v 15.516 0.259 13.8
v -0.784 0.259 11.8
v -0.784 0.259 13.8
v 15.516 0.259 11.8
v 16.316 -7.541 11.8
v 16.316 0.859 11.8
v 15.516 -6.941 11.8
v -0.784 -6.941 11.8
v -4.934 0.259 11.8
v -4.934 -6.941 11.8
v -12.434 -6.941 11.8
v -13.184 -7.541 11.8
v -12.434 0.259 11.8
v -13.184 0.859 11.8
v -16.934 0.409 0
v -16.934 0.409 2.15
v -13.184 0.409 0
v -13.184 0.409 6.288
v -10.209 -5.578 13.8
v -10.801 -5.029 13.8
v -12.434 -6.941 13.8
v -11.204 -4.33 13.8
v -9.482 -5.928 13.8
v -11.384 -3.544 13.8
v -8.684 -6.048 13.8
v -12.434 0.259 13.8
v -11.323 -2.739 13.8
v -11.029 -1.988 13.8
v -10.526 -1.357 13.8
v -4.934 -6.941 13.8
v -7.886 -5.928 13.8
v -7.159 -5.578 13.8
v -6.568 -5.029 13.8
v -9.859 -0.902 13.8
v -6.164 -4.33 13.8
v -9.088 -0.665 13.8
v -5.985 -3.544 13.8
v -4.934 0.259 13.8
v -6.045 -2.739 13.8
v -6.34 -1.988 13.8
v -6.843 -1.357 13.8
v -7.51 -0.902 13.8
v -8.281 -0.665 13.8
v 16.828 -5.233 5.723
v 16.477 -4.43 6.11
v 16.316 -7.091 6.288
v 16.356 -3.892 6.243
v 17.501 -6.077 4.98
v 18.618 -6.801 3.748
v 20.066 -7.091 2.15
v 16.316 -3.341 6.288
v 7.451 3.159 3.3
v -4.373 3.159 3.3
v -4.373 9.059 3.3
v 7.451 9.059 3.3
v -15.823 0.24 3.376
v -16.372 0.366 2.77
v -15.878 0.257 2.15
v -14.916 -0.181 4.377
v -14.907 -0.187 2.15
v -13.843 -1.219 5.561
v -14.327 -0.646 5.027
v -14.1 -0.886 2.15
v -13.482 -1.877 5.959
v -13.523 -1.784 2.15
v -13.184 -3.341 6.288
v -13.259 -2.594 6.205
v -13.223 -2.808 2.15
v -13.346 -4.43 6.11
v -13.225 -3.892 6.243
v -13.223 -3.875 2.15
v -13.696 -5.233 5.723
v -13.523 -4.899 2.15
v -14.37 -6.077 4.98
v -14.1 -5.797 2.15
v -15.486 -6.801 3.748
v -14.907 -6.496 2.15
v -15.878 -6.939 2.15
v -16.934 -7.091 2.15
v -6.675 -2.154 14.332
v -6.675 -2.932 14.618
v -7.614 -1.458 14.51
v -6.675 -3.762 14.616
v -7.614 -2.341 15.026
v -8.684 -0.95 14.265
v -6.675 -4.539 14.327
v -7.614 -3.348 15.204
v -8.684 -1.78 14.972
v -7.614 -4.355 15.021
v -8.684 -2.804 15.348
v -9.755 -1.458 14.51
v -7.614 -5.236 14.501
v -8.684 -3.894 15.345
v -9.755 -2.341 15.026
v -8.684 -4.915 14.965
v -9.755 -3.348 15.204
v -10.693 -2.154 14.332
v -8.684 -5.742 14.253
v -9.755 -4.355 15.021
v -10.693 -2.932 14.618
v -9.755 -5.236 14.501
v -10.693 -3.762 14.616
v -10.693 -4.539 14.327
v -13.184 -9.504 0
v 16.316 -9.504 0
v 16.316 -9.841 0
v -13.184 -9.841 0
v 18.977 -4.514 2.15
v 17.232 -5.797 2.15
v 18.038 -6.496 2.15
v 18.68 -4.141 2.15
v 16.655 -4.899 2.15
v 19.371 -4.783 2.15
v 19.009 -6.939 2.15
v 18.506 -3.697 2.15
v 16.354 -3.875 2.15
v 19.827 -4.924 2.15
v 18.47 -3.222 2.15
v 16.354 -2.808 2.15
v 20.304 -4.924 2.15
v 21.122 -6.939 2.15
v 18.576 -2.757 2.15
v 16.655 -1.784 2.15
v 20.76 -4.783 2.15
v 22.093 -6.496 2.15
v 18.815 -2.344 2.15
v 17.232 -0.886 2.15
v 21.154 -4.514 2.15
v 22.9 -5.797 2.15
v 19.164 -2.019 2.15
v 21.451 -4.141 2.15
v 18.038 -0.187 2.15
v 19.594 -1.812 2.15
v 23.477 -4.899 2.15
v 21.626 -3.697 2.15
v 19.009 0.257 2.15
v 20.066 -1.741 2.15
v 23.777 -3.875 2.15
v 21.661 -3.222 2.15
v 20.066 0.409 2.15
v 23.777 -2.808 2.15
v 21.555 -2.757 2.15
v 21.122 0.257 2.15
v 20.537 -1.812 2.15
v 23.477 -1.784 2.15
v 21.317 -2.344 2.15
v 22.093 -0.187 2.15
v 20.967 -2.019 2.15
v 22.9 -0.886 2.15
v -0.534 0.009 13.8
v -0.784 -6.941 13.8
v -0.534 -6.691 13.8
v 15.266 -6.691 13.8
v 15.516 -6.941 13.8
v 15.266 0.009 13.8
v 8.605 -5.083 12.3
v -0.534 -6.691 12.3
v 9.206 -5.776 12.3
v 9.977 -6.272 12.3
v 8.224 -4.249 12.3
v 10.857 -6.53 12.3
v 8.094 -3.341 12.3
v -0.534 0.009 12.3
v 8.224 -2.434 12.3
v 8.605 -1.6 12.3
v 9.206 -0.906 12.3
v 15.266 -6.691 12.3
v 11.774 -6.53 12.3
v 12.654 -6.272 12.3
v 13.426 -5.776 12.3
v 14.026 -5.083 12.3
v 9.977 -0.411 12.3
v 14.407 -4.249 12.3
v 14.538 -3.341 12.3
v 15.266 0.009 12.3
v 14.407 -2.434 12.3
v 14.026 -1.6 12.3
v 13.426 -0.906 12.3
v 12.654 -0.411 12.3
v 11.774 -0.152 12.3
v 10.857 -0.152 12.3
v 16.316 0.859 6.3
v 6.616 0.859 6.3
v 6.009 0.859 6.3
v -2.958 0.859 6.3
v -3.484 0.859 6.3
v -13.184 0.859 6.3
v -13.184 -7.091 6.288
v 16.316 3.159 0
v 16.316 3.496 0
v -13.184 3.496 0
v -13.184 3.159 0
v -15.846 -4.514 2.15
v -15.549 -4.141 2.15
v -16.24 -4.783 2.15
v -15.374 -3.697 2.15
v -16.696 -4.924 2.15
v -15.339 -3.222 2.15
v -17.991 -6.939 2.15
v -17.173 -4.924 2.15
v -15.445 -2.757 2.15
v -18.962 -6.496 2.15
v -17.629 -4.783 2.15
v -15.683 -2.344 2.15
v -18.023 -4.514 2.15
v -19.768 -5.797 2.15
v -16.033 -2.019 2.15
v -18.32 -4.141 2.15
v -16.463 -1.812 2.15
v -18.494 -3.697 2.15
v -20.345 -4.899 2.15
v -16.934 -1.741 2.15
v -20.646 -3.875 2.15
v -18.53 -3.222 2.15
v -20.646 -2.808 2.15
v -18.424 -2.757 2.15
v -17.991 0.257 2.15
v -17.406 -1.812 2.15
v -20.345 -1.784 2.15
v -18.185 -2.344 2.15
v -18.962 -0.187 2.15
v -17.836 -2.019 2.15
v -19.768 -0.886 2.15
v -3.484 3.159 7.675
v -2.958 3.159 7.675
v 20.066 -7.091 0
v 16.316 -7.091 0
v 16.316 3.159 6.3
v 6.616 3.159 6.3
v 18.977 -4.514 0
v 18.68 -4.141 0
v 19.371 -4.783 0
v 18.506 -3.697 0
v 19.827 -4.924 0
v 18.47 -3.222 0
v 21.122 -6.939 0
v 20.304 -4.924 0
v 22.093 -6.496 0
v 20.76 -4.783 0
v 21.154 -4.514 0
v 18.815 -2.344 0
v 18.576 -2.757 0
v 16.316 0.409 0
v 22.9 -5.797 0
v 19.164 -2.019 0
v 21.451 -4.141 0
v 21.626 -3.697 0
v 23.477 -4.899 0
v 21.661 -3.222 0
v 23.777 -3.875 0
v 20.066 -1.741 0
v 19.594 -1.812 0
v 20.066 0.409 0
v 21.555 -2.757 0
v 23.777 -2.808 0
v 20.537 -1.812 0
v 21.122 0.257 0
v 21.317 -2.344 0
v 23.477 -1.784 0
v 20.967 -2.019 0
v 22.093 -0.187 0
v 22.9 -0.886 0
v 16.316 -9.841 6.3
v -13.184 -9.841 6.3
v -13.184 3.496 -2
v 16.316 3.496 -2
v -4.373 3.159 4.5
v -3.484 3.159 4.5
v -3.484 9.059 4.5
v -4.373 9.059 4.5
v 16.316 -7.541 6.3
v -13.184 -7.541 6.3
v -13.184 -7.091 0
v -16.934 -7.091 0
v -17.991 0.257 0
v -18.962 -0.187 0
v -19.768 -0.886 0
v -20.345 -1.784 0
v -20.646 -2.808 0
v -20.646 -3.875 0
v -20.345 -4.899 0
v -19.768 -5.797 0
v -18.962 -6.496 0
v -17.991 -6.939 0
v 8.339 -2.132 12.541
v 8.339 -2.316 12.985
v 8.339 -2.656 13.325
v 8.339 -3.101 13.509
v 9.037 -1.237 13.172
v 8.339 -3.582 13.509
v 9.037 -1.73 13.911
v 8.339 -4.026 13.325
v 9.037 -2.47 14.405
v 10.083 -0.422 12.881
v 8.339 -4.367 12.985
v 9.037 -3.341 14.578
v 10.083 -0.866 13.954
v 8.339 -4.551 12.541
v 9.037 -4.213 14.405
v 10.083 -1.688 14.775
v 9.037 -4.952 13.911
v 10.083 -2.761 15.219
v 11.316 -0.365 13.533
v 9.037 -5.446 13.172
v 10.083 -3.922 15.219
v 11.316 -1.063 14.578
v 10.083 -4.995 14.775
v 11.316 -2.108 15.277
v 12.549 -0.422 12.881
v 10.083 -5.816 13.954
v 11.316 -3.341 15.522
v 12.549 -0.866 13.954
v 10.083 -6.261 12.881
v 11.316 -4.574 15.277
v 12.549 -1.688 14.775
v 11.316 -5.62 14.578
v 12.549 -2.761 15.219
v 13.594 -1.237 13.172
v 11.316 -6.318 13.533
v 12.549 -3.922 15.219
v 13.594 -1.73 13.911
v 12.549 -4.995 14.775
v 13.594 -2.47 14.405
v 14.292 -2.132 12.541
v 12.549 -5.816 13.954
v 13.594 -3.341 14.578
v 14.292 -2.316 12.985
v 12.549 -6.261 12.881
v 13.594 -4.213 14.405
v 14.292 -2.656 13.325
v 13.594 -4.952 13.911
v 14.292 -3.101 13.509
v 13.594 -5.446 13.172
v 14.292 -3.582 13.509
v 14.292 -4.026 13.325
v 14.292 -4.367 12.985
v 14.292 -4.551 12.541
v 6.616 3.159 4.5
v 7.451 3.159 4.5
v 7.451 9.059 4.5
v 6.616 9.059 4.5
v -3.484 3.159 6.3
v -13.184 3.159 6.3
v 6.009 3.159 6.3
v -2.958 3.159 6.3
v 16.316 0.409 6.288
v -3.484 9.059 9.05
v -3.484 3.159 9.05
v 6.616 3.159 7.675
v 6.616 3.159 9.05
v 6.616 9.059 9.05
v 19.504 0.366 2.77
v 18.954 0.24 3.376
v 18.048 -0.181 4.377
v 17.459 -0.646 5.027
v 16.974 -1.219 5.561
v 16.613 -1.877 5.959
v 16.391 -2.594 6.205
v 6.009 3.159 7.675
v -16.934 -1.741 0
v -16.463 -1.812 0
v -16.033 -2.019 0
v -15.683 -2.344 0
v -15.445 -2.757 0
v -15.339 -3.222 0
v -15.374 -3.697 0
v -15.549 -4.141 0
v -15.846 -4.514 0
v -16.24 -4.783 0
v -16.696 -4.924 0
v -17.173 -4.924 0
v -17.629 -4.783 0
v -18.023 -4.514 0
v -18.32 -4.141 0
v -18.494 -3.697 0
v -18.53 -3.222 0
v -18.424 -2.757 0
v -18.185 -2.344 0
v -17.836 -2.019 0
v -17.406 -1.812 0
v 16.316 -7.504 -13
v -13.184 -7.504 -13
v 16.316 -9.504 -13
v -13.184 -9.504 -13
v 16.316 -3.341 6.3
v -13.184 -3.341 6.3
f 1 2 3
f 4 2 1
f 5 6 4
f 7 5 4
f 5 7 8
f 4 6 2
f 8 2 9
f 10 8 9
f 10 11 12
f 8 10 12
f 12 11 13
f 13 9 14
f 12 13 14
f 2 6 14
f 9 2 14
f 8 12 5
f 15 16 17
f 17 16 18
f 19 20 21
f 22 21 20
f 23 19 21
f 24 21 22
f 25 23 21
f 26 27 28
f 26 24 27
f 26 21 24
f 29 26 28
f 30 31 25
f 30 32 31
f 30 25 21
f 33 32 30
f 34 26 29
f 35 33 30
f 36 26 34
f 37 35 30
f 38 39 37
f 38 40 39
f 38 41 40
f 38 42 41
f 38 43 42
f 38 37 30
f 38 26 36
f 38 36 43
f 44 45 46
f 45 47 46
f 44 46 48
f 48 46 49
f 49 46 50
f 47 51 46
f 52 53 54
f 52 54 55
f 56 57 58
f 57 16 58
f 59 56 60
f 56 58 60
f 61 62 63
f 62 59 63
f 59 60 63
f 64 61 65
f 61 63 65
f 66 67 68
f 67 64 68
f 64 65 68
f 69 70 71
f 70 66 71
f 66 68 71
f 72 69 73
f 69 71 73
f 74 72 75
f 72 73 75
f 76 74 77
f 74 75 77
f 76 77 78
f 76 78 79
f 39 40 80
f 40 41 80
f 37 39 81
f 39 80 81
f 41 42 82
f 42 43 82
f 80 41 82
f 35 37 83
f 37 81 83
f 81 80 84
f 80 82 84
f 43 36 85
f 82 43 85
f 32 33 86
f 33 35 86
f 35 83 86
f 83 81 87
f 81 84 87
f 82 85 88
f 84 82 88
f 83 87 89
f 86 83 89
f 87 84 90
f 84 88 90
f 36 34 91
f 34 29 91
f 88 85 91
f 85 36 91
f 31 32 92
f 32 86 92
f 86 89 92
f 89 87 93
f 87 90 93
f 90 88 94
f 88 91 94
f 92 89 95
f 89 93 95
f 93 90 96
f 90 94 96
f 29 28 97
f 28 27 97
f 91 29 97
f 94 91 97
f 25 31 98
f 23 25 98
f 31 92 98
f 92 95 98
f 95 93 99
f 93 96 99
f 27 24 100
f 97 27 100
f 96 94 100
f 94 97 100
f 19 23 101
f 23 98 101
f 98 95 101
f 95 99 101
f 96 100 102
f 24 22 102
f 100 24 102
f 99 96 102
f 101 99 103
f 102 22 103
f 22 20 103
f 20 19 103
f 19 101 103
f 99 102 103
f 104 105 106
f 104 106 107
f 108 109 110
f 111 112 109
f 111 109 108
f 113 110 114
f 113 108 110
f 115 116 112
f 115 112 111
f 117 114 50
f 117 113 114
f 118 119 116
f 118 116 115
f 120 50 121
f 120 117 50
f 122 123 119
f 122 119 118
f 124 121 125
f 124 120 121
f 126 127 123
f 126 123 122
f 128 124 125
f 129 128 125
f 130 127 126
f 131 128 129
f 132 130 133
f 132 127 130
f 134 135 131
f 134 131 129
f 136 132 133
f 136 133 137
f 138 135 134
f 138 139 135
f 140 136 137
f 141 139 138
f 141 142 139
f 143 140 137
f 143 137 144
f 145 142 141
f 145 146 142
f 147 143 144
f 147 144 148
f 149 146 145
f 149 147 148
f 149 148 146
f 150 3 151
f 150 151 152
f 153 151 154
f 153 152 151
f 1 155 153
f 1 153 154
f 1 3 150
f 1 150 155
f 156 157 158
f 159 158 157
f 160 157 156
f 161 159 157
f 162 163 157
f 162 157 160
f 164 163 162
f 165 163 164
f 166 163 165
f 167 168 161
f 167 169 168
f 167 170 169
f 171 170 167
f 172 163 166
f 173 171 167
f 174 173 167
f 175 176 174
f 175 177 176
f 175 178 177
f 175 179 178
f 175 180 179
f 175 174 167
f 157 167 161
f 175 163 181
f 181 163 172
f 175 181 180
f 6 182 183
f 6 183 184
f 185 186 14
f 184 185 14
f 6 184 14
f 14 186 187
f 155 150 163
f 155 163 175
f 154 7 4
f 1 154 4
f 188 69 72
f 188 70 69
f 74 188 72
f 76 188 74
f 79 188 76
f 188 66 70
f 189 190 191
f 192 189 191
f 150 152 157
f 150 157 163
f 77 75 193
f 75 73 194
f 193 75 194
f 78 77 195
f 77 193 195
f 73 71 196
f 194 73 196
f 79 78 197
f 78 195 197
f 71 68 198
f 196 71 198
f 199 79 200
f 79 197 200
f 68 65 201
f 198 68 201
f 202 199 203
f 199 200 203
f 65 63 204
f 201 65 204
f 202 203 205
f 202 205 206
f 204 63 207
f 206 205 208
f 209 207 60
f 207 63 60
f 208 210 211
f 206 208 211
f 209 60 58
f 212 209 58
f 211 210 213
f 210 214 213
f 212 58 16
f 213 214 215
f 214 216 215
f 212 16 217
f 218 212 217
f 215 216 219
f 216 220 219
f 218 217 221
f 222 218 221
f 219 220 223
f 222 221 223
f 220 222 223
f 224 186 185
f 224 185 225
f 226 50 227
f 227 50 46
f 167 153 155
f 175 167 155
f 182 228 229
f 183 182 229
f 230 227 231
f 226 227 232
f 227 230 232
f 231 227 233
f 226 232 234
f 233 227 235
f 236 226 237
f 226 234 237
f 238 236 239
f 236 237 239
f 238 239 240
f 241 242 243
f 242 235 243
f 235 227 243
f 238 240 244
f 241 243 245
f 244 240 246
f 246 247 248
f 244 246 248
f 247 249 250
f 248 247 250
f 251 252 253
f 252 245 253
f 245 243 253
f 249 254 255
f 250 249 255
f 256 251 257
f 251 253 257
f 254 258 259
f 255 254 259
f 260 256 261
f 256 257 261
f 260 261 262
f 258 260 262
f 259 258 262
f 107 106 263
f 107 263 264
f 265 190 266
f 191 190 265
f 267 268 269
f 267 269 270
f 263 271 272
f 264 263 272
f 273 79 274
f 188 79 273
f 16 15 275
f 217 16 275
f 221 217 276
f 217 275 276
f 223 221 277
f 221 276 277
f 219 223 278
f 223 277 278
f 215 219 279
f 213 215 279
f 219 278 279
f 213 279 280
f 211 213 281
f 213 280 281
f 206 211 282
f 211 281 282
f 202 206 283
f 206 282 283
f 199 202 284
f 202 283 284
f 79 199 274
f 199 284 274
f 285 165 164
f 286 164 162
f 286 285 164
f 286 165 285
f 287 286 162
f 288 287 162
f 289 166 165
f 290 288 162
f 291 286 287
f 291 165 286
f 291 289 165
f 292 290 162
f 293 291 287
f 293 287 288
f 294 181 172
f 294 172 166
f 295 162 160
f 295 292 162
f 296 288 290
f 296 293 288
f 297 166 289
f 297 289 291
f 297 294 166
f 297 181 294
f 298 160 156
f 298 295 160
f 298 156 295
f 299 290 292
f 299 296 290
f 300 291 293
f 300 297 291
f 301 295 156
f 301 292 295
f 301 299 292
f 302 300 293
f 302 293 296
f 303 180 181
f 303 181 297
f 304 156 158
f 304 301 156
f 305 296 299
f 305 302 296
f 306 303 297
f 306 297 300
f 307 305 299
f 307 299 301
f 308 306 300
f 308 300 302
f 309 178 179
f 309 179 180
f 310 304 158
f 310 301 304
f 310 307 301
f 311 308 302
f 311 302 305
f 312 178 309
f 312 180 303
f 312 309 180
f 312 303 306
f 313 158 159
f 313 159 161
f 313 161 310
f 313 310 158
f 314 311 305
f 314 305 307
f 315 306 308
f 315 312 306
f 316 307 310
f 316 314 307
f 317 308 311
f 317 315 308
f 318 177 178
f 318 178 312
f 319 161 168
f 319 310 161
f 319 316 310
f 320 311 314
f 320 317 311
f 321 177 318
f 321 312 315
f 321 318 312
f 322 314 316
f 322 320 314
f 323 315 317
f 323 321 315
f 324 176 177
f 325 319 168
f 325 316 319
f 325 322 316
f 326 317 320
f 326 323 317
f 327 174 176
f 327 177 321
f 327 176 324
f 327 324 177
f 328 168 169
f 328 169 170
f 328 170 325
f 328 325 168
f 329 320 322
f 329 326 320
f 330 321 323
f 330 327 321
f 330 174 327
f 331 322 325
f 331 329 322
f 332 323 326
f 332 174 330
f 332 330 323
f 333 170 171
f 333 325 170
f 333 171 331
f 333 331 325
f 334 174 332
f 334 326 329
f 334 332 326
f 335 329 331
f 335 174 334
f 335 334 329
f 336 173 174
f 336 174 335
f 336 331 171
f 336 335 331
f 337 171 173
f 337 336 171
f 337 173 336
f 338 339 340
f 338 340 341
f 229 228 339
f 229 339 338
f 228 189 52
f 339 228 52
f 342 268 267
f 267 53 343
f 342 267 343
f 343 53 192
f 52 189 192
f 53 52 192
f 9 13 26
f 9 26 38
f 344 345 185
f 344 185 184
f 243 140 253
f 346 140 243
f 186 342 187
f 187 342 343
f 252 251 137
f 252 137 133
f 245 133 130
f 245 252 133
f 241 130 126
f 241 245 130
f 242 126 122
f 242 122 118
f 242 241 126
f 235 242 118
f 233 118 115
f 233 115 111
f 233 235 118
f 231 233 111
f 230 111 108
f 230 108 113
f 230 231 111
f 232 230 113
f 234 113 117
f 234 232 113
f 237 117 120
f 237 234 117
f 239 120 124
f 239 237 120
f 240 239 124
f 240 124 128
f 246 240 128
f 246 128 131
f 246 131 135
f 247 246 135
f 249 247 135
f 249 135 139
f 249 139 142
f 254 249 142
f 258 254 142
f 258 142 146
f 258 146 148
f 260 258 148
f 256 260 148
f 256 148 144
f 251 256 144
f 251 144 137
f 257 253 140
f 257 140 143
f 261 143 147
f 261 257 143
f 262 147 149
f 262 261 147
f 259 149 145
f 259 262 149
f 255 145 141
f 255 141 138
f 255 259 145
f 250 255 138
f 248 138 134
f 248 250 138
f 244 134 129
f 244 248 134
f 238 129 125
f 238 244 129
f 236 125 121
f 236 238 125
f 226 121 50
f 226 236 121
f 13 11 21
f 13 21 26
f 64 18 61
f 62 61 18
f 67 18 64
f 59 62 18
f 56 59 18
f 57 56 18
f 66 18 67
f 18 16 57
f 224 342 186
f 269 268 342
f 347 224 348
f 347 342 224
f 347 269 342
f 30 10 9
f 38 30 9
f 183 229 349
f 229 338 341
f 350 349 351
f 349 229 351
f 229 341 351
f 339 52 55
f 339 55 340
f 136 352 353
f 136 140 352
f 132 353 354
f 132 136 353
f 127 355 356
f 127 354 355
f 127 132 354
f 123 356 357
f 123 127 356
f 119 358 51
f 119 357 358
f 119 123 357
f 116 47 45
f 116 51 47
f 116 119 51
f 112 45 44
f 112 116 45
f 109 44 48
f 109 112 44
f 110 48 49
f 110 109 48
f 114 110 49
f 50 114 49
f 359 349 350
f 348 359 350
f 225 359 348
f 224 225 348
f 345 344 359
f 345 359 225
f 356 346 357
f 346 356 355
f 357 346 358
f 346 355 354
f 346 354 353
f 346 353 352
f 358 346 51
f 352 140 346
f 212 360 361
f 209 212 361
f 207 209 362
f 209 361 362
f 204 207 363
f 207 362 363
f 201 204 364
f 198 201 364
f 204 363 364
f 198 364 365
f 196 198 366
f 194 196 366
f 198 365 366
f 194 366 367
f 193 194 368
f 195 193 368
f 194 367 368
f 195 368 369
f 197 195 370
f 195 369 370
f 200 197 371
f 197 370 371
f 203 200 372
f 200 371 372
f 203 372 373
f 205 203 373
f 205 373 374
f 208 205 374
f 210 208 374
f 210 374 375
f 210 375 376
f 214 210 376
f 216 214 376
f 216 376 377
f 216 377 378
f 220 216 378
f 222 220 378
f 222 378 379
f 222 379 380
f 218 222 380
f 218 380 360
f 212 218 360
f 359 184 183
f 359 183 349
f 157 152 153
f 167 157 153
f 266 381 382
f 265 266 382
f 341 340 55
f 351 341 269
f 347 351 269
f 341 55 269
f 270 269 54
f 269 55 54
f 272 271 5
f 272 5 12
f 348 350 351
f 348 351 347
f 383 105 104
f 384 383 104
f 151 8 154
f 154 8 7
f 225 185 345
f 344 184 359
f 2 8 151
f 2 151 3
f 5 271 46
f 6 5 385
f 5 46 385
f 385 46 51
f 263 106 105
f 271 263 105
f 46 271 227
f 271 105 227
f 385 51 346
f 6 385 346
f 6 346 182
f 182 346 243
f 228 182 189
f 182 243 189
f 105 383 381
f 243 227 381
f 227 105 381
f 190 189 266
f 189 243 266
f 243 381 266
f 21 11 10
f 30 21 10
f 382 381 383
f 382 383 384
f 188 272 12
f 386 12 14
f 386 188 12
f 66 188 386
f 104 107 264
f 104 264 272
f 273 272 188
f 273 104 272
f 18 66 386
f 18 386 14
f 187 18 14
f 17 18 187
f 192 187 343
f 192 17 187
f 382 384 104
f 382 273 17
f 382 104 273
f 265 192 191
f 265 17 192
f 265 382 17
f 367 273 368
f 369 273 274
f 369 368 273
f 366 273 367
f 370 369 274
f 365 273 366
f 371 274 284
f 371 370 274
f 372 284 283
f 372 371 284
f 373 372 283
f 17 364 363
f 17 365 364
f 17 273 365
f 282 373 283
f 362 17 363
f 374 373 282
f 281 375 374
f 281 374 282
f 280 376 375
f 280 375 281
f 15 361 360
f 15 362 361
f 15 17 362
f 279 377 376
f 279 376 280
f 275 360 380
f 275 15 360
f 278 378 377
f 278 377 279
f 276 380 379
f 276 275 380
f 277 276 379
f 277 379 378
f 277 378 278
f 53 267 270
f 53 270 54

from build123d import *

# Parameters (mm, degrees)
BOSS_EXTRU_2_DEPTH      = 2.15
ESQUISSE2_W             = 14.75
ESQUISSE2_H             = 13
BOSS_EXTRU_3_DEPTH      = 6.3
BOSS_EXTRU_4_DEPTH      = 7.5
BOSS_EXTRUDE1_DEPTH     = 13
CHAMFER1_SIZE           = 11
ESQUISSE3_R             = 1.6
ENL_V_MAT_EXTRU_1_DEPTH = 6.3
ENL_V_START             = -4.15
ESQUISSE11_R            = 3.75
ENL_V_MAT_EXTRU_2_DEPTH = 4.15
ESQUISSE12_W            = 14.75
ESQUISSE12_H            = 8.4
BOSS_EXTRU_5_DEPTH      = 5.5
ESQUISSE13_W            = 16.3
ESQUISSE13_H            = 7.2
BOSS_EXTRU_6_DEPTH      = 2
ESQUISSE14_W            = 7.5
ESQUISSE14_H            = 7.2
BOSS_EXTRU_7_DEPTH      = 2
ESQUISSE16_W            = 15.8
ESQUISSE16_H            = 6.7
ENL_V_MAT_EXTRU_3_DEPTH = 1.5
BOSS_EXTRU_9_DEPTH      = 5.9
BOSS_EXTRU_10_DEPTH     = 10.1
ESQUISSE20_W            = 8.967116883
ESQUISSE20_H            = 2.3
ENL_V_MAT_EXTRU_4_DEPTH = 10.1


with BuildPart() as part:
    # Esquisse1 → Boss.-Extru.2 (new body)
    with BuildSketch(Plane.XY):
        with BuildLine():
            Line((20.065642458, -7.091397664), (16.315642458, -7.091397664))
            Line((16.315642458, -7.091397664), (16.315642458, 0.408602336))
            Line((16.315642458, 0.408602336), (20.065642458, 0.408602336))
            ThreePointArc((20.065642458, 0.408602336), (23.815642458, -3.341397664), (20.065642458, -7.091397664))
        make_face()
    extrude(amount=BOSS_EXTRU_2_DEPTH)



with BuildPart() as body_2:
    # Esquisse2 → Boss.-Extru.3 (new body)
    with BuildSketch(Plane.XY):
        with Locations((8.940642458, -3.341397664)):
            Rectangle(ESQUISSE2_W, ESQUISSE2_H)
    extrude(amount=BOSS_EXTRU_3_DEPTH)


with BuildPart() as part_1:
    add(part.part)

    add(body_2.part)  # Boss.-Extru.4 merges body 2
    # Esquisse10 → Boss.-Extru.4 (add)
    with BuildSketch(Plane.XZ.offset(7.091397664)):
        Polygon((16.315642458, 6.287787974), (20.065642458, 2.15), (16.315642458, 2.15), align=None)
    extrude(amount=-BOSS_EXTRU_4_DEPTH)

    # Esquisse1<5> → Boss-Extrude1 (add)
    with BuildSketch(Plane.XY):
        Polygon((16.315642458, 3.496275605), (1.565642458, 3.496275605), (1.565642458, -9.503724395), (16.315642458, -9.503724395), (16.315642458, -7.091397664), (16.315642458, 0.408602336), align=None)
    extrude(amount=-BOSS_EXTRUDE1_DEPTH)

    # Chamfer1
    chamfer1_edges = [part_1.edges().sort_by_distance(p)[0] for p in [
        (8.940642458, 3.496275605, -13),
    ]]
    chamfer(chamfer1_edges, length=CHAMFER1_SIZE)

    # Esquisse3 → Enlèv. mat.-Extru.1 (cut)
    with BuildSketch(Plane.XY):
        with Locations((-16.934357542, -3.341397664)):
            Circle(ESQUISSE3_R)
        with Locations((20.065642458, -3.341397664)):
            Circle(ESQUISSE3_R)
    extrude(amount=ENL_V_MAT_EXTRU_1_DEPTH, mode=Mode.SUBTRACT)

    # Esquisse11 → Enlèv. mat.-Extru.2 (cut)
    with BuildSketch(Plane.XY.offset(6.3).offset(ENL_V_START)):
        with Locations((20.065642458, -3.341397664)):
            Circle(ESQUISSE11_R)
    extrude(amount=ENL_V_MAT_EXTRU_2_DEPTH, mode=Mode.SUBTRACT)

    # Esquisse12 → Boss.-Extru.5 (add)
    with BuildSketch(Plane.XY.offset(6.3)):
        with Locations((8.940642458, -3.341397664)):
            Rectangle(ESQUISSE12_W, ESQUISSE12_H)
    extrude(amount=BOSS_EXTRU_5_DEPTH)

    # Symétrie15: part across plane


with BuildPart() as part_2:
    add(part_1.part)
    add(part_1.part.mirror(Plane(origin=(1.565642458, 3.158602336, 6.3), x_dir=(0, 0, 1), z_dir=(1, 0, 0))))

    # Esquisse13 → Boss.-Extru.6 (add)
    with BuildSketch(Plane.XY.offset(11.8)):
        with Locations((7.365642458, -3.341397664)):
            Rectangle(ESQUISSE13_W, ESQUISSE13_H)
    extrude(amount=BOSS_EXTRU_6_DEPTH)

    # Esquisse14 → Boss.-Extru.7 (add)
    with BuildSketch(Plane.XY.offset(11.8)):
        with Locations((-8.684357542, -3.341397664)):
            Rectangle(ESQUISSE14_W, ESQUISSE14_H)
    extrude(amount=BOSS_EXTRU_7_DEPTH)

    # Esquisse16 → Enlèv. mat.-Extru.3 (cut)
    with BuildSketch(Plane.XY.offset(13.8)):
        with Locations((7.365642458, -3.341397664)):
            Rectangle(ESQUISSE16_W, ESQUISSE16_H)
    extrude(amount=-ENL_V_MAT_EXTRU_3_DEPTH, mode=Mode.SUBTRACT)

    # Esquisse15 → Révolution14 (revolve)
    with BuildSketch(Plane.XY.offset(12.3)):
        with BuildLine():
            Line((14.537530361, -3.341397664), (8.093754555, -3.341397664))
            ThreePointArc((8.093754555, -3.341397664), (11.315642458, -6.563285567), (14.537530361, -3.341397664))
        make_face()
        with BuildLine():
            Line((-11.779153482, -3.341397664), (-5.589561602, -3.341397664))
            ThreePointArc((-5.589561602, -3.341397664), (-8.684357542, -6.436193604), (-11.779153482, -3.341397664))
        make_face()
    revolve(axis=Axis((-12.130427956, -3.341397664, 12.3), (1, 0, 0)))

    # Esquisse18 → Boss.-Extru.9 (add)
    with BuildSketch(Plane(origin=(0, 3.158602336, 0), x_dir=(1, 0, 0), z_dir=(0, 1, 0))):
        Polygon((6.615642458, -4.5), (6.615642458, -9.05), (-3.484357542, -9.05), (-3.484357542, -4.5), (-4.37348724, -4.5), (-4.37348724, -3.3), (7.451018627, -3.3), (7.451018627, -4.5), align=None)
    extrude(amount=BOSS_EXTRU_9_DEPTH)

    # Esquisse19 → Boss.-Extru.10 (add)
    with BuildSketch(Plane.ZY.offset(3.484357542)):
        Polygon((6.3, 0.858602336), (7.675, 3.158602336), (6.3, 3.158602336), align=None)
    extrude(amount=-BOSS_EXTRU_10_DEPTH)

    # Esquisse20 → Enlèv. mat.-Extru.4 (cut)
    with BuildSketch(Plane.XY.offset(6.3)):
        with Locations((1.525201642, 2.008602336)):
            Rectangle(ESQUISSE20_W, ESQUISSE20_H)
    extrude(amount=ENL_V_MAT_EXTRU_4_DEPTH, mode=Mode.SUBTRACT)


solid = part_2.part
